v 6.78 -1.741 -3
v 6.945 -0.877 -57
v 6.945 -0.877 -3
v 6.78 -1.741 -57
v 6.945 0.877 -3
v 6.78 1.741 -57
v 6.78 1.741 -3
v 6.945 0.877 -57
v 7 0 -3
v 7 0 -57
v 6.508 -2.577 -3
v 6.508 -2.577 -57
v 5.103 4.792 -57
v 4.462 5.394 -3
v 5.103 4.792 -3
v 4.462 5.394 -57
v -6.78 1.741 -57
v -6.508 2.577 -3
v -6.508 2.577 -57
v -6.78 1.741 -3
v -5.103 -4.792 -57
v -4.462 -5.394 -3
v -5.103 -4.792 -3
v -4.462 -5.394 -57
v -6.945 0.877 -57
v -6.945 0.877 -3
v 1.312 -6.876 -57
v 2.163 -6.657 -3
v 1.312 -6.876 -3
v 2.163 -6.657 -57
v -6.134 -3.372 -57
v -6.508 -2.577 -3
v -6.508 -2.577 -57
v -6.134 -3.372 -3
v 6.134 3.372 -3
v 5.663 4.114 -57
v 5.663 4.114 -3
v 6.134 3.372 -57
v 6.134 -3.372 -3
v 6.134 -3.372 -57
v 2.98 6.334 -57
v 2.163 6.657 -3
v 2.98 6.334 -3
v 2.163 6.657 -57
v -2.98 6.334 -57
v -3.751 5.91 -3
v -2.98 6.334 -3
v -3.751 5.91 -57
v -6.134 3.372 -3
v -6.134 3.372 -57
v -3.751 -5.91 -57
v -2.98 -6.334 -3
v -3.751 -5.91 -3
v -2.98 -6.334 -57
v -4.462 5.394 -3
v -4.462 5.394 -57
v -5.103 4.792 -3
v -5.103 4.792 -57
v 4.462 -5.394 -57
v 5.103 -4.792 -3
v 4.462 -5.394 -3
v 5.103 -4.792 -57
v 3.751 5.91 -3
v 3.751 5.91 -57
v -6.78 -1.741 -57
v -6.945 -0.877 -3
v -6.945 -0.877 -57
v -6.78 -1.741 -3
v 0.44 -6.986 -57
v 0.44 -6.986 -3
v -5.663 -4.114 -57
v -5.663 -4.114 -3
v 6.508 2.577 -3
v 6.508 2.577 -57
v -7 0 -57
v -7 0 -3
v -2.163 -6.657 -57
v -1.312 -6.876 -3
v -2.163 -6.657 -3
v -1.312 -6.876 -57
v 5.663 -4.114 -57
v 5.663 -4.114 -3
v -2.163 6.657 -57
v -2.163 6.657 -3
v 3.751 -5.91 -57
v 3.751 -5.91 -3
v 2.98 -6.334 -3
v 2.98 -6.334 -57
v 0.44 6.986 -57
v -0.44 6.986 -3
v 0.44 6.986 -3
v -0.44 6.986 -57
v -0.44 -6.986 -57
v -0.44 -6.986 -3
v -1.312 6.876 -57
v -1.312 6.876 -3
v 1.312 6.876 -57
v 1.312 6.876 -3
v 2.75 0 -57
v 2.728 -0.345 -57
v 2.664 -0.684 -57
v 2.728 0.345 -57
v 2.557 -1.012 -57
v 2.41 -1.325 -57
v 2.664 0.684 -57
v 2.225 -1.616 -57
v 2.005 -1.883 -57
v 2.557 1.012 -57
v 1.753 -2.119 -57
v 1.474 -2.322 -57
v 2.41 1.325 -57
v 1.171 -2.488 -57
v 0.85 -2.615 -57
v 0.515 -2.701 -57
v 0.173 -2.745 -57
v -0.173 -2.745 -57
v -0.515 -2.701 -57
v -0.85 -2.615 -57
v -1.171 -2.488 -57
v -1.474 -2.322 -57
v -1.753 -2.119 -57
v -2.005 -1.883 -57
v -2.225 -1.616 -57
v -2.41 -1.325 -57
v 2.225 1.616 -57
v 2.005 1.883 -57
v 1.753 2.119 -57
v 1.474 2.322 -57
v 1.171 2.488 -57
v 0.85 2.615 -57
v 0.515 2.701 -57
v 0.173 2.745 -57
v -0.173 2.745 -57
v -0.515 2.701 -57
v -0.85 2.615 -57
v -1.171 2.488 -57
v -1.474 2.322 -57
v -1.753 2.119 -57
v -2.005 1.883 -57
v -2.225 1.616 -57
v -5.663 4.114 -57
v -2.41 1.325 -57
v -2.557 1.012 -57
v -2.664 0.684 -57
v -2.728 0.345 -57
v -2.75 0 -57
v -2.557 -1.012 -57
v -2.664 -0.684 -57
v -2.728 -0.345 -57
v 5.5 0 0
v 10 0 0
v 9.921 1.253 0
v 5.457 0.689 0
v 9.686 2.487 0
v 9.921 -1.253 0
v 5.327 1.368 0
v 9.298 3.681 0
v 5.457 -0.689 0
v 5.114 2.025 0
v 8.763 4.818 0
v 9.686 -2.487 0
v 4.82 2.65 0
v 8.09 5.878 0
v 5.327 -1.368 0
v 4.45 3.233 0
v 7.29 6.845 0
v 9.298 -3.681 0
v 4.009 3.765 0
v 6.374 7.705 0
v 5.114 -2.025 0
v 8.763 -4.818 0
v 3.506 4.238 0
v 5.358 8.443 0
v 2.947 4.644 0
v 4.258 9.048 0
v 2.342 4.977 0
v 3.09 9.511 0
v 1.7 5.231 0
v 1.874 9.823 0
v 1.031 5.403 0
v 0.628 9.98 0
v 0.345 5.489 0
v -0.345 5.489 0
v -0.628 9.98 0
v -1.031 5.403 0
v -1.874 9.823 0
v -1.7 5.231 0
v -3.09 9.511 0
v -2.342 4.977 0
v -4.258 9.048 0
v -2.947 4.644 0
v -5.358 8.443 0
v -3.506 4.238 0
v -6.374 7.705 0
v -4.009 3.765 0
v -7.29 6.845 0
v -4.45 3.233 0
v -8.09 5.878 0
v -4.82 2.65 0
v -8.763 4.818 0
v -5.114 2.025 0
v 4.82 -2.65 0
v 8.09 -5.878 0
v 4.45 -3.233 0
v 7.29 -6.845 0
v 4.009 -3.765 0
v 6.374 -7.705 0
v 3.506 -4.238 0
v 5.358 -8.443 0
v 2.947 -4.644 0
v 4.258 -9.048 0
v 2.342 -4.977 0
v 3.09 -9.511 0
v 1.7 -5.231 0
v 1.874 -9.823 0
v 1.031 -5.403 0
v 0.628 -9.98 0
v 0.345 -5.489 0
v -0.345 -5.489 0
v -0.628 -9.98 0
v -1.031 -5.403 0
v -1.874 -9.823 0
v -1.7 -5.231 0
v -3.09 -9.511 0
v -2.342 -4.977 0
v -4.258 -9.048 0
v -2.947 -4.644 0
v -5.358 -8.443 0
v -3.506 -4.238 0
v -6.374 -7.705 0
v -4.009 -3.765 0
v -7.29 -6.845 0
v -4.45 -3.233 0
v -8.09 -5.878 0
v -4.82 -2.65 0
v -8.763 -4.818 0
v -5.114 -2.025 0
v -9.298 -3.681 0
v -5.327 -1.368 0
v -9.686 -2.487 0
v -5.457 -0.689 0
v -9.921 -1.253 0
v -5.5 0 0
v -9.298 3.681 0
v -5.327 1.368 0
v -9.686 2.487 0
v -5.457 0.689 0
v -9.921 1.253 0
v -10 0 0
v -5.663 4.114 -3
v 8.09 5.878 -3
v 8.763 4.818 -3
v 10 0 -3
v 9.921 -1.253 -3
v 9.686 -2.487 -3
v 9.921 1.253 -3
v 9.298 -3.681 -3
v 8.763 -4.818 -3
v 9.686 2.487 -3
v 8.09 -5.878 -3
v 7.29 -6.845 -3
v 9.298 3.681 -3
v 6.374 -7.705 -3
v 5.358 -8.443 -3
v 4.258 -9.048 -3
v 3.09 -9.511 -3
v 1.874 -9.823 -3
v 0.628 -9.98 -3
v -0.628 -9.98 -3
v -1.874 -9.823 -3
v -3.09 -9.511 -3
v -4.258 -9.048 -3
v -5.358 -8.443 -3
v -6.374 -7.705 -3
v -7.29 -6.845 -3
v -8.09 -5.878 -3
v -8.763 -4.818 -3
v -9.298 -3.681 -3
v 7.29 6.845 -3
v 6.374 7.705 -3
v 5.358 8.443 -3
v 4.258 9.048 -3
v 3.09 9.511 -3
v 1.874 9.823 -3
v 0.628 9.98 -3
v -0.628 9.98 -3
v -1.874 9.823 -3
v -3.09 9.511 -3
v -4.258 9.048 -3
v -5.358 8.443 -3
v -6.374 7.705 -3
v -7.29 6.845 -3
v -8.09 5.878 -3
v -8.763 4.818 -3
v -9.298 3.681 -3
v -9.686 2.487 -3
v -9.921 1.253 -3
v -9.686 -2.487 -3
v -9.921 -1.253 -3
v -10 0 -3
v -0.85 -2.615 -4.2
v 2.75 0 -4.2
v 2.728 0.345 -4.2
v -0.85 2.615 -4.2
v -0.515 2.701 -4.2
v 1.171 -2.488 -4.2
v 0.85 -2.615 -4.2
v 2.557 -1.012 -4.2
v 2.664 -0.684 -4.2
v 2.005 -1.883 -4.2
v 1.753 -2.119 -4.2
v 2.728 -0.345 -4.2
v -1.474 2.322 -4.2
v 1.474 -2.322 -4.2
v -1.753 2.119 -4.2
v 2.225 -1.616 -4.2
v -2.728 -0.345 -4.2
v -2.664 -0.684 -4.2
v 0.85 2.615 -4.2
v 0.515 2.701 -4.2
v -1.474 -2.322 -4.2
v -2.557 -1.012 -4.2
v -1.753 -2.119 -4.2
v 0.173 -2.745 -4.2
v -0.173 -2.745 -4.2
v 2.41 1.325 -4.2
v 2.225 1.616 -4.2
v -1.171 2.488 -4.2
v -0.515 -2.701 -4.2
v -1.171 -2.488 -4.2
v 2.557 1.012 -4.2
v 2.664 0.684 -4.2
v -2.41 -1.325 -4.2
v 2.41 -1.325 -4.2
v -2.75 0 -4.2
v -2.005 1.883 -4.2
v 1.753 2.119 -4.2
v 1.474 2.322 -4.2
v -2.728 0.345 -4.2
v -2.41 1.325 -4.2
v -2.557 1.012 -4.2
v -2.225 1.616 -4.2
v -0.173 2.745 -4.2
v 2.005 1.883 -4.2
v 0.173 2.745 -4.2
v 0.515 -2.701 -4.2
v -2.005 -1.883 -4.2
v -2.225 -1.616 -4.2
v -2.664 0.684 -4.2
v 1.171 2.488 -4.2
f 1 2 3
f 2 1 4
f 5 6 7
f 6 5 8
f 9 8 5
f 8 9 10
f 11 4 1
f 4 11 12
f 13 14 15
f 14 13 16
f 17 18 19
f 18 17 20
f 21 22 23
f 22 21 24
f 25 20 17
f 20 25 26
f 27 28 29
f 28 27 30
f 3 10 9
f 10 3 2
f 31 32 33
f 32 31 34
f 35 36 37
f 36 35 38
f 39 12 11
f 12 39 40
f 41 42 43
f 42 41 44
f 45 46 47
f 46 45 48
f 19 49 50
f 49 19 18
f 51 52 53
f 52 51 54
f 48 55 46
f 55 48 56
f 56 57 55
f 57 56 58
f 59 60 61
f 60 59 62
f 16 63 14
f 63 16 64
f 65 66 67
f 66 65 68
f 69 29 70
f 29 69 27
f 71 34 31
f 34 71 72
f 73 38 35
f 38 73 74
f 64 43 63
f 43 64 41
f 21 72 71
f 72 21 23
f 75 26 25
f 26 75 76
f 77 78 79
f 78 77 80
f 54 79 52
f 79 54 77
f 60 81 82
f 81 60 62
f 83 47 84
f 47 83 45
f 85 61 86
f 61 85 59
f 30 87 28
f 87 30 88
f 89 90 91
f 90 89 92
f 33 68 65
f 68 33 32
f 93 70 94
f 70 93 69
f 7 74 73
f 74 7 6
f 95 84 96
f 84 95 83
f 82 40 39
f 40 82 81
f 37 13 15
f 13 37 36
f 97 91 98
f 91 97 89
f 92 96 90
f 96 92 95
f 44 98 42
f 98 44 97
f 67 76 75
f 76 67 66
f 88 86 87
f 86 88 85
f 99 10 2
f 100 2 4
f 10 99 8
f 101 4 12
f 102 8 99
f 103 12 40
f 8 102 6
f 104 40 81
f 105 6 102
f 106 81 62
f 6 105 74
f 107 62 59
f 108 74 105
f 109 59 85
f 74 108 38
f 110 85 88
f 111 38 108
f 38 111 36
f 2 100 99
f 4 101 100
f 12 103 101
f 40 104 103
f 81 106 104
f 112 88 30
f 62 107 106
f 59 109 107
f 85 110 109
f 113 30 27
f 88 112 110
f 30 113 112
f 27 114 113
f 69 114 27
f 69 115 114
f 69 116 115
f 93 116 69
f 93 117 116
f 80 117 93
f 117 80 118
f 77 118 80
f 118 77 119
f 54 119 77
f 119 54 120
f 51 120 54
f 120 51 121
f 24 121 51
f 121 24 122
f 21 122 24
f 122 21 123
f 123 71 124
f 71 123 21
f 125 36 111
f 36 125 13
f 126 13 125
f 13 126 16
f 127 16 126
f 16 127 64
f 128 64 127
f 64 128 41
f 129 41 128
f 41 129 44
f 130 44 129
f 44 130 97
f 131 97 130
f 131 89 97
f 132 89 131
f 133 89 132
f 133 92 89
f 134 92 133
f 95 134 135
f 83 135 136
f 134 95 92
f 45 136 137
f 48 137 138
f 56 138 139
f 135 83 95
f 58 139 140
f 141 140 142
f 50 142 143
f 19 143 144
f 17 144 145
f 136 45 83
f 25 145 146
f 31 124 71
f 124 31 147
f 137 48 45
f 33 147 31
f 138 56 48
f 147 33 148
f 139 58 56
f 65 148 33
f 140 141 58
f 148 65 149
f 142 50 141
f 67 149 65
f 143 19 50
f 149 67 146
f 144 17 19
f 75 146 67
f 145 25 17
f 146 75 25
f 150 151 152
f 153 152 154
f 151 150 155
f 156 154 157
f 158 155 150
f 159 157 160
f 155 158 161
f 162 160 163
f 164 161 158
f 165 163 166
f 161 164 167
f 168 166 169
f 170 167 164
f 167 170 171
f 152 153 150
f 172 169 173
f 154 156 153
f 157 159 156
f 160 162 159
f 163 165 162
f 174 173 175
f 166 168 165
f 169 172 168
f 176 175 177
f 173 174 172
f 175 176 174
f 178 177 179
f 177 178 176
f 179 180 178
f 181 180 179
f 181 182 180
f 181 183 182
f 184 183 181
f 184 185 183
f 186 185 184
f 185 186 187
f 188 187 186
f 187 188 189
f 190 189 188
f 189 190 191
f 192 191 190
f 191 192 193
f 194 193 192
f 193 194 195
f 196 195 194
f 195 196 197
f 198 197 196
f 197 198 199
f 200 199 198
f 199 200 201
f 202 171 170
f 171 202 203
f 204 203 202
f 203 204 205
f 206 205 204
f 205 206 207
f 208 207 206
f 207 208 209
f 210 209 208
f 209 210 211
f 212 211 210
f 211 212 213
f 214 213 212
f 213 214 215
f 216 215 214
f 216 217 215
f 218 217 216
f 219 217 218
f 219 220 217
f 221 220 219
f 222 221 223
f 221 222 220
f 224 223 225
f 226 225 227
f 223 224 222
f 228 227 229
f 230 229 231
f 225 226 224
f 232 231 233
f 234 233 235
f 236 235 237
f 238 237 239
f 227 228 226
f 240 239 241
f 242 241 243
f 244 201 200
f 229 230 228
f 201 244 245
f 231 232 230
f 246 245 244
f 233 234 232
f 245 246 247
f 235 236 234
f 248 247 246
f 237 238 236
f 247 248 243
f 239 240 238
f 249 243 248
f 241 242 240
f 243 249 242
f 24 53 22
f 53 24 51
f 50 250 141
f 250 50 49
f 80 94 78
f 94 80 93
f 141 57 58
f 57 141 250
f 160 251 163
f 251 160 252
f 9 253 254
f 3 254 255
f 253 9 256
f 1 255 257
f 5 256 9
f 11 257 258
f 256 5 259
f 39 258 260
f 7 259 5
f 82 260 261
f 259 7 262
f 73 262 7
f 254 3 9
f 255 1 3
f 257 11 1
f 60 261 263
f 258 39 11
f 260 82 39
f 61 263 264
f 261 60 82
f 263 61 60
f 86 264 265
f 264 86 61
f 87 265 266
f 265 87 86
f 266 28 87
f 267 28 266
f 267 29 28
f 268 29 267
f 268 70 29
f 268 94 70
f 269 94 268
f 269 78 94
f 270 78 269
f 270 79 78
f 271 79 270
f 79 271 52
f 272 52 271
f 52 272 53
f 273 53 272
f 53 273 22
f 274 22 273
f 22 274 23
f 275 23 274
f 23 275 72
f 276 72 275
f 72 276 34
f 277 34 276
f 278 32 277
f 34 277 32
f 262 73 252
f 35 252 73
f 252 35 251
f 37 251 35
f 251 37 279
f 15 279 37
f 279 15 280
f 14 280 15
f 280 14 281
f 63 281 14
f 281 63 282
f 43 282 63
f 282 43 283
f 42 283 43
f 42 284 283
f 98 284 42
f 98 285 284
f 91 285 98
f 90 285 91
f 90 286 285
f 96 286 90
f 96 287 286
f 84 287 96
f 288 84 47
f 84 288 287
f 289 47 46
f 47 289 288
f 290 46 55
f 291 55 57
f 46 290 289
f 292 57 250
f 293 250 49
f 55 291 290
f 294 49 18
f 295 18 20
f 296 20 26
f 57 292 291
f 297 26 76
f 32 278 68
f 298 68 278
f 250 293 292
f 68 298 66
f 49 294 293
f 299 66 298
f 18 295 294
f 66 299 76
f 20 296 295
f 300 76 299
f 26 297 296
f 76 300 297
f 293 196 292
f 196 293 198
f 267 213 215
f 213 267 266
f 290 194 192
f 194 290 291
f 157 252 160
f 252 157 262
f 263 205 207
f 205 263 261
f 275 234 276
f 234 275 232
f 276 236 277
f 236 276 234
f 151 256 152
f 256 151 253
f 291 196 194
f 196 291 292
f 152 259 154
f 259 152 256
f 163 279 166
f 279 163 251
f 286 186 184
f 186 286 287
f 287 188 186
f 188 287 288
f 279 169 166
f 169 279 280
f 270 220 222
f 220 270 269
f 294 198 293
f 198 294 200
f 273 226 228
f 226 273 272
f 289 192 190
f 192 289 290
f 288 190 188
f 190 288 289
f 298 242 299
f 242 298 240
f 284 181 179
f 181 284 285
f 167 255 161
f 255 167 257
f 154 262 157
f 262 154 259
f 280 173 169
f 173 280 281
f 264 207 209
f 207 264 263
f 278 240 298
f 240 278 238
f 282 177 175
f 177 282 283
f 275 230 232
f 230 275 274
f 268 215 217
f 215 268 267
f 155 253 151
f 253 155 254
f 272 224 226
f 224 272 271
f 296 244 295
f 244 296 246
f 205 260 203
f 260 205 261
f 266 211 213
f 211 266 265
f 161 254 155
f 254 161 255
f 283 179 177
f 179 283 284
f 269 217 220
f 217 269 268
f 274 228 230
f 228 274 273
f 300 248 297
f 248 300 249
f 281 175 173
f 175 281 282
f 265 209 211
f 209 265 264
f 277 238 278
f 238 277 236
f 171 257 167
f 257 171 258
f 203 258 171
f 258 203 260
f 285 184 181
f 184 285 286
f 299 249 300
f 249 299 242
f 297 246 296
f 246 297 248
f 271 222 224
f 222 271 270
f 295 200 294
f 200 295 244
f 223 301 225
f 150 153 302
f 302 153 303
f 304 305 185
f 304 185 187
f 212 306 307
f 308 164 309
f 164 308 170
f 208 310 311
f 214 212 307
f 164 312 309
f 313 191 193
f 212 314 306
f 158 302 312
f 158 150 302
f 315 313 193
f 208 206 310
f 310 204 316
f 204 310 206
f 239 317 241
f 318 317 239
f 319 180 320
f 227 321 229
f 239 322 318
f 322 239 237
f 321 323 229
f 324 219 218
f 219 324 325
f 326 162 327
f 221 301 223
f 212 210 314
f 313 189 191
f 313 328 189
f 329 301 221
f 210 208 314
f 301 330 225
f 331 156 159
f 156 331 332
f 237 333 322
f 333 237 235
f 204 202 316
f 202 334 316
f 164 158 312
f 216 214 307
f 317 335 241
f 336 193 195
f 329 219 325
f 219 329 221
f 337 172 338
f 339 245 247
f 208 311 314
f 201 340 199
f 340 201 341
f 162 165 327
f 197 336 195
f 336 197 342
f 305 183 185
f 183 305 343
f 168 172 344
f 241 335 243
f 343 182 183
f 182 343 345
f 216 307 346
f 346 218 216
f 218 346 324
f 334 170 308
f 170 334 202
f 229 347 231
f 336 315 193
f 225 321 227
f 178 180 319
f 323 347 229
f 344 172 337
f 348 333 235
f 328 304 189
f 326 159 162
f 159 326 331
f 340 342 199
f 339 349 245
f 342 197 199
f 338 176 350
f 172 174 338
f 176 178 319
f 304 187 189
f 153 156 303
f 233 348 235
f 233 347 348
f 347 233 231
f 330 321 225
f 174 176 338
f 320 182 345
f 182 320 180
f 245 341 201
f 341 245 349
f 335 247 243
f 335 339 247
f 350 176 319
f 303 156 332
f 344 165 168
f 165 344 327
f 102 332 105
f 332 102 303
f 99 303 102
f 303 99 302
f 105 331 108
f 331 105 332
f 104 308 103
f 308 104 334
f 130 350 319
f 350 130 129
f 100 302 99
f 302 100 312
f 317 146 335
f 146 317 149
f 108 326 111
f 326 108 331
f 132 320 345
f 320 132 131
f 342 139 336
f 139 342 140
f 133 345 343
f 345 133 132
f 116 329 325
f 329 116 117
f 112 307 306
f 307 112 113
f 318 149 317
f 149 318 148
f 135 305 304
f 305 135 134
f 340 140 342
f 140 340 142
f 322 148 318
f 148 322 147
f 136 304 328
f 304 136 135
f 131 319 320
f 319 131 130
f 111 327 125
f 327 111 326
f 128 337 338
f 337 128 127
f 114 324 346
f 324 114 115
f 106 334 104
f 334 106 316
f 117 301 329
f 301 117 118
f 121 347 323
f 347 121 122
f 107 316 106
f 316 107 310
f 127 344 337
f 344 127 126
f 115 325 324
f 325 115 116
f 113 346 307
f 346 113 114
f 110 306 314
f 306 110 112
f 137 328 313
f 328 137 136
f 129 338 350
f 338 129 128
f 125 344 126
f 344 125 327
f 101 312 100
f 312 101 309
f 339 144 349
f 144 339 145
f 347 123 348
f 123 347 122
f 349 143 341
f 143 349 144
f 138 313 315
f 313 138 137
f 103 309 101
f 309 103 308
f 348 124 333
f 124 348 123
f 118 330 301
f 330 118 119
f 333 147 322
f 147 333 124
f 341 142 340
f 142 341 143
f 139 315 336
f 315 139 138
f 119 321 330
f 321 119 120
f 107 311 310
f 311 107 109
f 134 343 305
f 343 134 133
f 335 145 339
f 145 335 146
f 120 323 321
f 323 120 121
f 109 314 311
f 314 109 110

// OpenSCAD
$fn = 50;


difference() {
	union() {
		translate(v = [0, 0, -57.0000000000]) {
			cylinder(h = 57, r = 7.0000000000);
		}
		translate(v = [0, 0, -3.0000000000]) {
			cylinder(h = 3, r = 10.0000000000);
		}
	}
	union() {
		translate(v = [0, 0, 0]) {
			rotate(a = [0, 0, 0]) {
				difference() {
					union() {
						#translate(v = [0, 0, -57.0000000000]) {
							cylinder(h = 57, r = 2.2500000000);
						}
						#translate(v = [0, 0, -4.2000000000]) {
							cylinder(h = 4.2000000000, r = 7.0000000000, r1 = 2.7500000000, r2 = 5.5000000000);
						}
						#translate(v = [0, 0, -57.0000000000]) {
							cylinder(h = 57, r = 2.7500000000);
						}
						#translate(v = [0, 0, -57.0000000000]) {
							cylinder(h = 57, r = 2.2500000000);
						}
					}
					union();
				}
			}
		}
	}
}
